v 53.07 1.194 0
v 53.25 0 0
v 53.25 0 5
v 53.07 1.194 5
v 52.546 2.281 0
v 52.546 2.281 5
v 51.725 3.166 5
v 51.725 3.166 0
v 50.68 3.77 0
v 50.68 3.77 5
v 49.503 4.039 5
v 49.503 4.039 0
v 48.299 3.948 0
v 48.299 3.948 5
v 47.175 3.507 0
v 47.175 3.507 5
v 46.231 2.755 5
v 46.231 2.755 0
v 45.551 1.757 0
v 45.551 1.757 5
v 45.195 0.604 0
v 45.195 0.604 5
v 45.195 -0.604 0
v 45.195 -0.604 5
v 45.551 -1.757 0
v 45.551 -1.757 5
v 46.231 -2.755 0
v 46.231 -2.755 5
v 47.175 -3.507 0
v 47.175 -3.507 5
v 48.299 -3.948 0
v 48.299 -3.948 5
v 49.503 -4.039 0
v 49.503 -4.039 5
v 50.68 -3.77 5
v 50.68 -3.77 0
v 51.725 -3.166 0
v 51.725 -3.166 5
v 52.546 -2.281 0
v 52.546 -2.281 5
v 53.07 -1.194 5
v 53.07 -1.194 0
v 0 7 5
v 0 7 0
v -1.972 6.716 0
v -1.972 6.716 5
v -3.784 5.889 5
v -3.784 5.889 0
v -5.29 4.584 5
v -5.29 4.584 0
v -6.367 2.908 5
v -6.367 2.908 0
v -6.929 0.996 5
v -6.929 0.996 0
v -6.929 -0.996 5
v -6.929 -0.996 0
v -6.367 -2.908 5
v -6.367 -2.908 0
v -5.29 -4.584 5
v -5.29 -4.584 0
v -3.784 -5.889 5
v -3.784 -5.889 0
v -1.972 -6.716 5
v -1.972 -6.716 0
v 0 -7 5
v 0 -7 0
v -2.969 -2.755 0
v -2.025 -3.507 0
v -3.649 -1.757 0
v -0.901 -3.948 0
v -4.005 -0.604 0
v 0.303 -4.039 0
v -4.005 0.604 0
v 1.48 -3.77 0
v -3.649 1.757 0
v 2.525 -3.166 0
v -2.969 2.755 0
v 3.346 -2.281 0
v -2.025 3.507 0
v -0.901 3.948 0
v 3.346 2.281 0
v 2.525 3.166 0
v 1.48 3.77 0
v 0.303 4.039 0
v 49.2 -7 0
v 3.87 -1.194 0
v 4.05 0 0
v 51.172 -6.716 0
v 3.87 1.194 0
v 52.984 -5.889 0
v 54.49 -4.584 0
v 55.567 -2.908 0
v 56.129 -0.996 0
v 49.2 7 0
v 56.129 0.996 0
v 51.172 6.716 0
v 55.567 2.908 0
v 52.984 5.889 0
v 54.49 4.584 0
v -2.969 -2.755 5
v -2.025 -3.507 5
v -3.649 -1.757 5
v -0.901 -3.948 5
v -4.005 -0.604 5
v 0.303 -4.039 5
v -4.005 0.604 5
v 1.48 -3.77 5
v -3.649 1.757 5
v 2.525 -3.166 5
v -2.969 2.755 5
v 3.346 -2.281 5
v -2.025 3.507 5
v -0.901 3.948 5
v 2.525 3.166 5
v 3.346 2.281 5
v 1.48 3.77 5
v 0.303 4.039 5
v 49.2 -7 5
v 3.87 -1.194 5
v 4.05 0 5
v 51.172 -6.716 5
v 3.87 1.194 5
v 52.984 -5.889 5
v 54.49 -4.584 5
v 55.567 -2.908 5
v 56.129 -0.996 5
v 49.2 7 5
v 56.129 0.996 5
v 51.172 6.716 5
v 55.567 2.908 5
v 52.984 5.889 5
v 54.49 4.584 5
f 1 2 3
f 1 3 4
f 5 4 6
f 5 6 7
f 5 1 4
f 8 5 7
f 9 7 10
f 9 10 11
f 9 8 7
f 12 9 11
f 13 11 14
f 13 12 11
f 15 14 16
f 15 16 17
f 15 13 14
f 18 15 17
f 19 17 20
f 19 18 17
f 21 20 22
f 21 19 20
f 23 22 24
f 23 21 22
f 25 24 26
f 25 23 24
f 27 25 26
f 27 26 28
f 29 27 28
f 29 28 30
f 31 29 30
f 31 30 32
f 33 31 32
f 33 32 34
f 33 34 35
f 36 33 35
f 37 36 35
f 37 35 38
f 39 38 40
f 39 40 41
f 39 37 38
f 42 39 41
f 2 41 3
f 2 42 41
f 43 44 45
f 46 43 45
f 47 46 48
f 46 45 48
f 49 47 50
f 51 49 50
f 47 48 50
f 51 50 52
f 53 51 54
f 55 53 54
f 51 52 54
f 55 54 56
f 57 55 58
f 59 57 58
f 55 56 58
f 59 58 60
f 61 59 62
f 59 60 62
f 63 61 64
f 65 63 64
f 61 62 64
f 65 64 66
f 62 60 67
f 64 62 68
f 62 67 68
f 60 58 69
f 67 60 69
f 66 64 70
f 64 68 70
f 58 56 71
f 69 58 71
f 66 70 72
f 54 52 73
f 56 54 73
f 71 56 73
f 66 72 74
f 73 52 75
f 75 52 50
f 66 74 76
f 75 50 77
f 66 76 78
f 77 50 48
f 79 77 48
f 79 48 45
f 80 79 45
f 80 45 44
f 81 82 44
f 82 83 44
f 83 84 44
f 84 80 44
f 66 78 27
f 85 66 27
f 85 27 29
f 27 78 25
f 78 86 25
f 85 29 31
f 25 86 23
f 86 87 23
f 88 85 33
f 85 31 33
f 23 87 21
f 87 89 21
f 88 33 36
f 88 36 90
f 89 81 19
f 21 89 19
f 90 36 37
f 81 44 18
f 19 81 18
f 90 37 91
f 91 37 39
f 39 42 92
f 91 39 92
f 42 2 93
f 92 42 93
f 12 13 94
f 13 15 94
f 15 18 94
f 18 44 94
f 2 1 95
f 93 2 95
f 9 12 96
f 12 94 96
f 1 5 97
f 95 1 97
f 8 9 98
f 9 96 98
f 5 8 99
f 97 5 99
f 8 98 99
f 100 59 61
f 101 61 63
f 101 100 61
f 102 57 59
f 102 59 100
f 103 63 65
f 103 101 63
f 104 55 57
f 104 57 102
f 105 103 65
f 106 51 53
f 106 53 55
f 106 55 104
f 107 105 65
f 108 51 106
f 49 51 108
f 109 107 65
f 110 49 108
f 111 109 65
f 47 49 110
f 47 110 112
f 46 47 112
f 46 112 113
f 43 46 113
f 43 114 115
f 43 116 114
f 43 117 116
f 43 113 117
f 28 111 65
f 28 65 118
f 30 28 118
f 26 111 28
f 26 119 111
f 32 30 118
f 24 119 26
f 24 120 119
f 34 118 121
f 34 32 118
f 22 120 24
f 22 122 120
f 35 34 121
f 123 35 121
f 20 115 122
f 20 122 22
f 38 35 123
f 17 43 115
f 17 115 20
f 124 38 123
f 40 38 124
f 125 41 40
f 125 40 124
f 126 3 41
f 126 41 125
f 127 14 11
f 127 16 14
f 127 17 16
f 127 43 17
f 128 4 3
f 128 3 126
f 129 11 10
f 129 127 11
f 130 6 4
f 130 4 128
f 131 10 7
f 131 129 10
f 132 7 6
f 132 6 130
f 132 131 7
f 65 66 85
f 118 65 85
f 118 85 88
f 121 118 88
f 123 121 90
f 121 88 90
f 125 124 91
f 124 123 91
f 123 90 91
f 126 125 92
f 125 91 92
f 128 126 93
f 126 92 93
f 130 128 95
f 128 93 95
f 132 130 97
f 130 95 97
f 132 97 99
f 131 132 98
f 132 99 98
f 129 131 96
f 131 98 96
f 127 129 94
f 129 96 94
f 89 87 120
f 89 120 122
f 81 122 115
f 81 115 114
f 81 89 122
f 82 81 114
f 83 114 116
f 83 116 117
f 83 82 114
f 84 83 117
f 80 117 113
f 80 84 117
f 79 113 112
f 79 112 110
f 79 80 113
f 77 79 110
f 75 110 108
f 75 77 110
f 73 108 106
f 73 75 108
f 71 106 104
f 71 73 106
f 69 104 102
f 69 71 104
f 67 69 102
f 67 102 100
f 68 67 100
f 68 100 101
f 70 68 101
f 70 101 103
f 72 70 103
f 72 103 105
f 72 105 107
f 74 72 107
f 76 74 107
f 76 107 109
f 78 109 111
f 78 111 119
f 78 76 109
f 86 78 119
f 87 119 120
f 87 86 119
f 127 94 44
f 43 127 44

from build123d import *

# Parameters (mm, degrees)
SKETCH_1_R      = 7
SKETCH_1_R_2    = 4.05
EXTRUDE_1_DEPTH = 5


with BuildPart() as part:
    # 草图1 → 凸台-拉伸1 (new body)
    # profile 1 of 3: a face of its own
    with BuildSketch(Plane.XY):
        with BuildLine():
            ThreePointArc((7, 0), (4.949747468, -4.949747468), (0, -7))
            Line((0, -7), (49.2, -7))
            ThreePointArc((49.2, -7), (42.2, 0), (49.2, 7))
            Line((49.2, 7), (0, 7))
            ThreePointArc((0, 7), (4.949747468, 4.949747468), (7, 0))
        make_face()
    # profile 2 of 3: a face of its own
    with BuildSketch(Plane.XY):
        Circle(SKETCH_1_R)
        Circle(SKETCH_1_R_2, mode=Mode.SUBTRACT)
    # profile 3 of 3: a face of its own
    with BuildSketch(Plane.XY):
        with Locations((49.2, 0)):
            Circle(SKETCH_1_R)
        with Locations((49.2, 0)):
            Circle(SKETCH_1_R_2, mode=Mode.SUBTRACT)
    extrude(amount=EXTRUDE_1_DEPTH)


solid = part.part
